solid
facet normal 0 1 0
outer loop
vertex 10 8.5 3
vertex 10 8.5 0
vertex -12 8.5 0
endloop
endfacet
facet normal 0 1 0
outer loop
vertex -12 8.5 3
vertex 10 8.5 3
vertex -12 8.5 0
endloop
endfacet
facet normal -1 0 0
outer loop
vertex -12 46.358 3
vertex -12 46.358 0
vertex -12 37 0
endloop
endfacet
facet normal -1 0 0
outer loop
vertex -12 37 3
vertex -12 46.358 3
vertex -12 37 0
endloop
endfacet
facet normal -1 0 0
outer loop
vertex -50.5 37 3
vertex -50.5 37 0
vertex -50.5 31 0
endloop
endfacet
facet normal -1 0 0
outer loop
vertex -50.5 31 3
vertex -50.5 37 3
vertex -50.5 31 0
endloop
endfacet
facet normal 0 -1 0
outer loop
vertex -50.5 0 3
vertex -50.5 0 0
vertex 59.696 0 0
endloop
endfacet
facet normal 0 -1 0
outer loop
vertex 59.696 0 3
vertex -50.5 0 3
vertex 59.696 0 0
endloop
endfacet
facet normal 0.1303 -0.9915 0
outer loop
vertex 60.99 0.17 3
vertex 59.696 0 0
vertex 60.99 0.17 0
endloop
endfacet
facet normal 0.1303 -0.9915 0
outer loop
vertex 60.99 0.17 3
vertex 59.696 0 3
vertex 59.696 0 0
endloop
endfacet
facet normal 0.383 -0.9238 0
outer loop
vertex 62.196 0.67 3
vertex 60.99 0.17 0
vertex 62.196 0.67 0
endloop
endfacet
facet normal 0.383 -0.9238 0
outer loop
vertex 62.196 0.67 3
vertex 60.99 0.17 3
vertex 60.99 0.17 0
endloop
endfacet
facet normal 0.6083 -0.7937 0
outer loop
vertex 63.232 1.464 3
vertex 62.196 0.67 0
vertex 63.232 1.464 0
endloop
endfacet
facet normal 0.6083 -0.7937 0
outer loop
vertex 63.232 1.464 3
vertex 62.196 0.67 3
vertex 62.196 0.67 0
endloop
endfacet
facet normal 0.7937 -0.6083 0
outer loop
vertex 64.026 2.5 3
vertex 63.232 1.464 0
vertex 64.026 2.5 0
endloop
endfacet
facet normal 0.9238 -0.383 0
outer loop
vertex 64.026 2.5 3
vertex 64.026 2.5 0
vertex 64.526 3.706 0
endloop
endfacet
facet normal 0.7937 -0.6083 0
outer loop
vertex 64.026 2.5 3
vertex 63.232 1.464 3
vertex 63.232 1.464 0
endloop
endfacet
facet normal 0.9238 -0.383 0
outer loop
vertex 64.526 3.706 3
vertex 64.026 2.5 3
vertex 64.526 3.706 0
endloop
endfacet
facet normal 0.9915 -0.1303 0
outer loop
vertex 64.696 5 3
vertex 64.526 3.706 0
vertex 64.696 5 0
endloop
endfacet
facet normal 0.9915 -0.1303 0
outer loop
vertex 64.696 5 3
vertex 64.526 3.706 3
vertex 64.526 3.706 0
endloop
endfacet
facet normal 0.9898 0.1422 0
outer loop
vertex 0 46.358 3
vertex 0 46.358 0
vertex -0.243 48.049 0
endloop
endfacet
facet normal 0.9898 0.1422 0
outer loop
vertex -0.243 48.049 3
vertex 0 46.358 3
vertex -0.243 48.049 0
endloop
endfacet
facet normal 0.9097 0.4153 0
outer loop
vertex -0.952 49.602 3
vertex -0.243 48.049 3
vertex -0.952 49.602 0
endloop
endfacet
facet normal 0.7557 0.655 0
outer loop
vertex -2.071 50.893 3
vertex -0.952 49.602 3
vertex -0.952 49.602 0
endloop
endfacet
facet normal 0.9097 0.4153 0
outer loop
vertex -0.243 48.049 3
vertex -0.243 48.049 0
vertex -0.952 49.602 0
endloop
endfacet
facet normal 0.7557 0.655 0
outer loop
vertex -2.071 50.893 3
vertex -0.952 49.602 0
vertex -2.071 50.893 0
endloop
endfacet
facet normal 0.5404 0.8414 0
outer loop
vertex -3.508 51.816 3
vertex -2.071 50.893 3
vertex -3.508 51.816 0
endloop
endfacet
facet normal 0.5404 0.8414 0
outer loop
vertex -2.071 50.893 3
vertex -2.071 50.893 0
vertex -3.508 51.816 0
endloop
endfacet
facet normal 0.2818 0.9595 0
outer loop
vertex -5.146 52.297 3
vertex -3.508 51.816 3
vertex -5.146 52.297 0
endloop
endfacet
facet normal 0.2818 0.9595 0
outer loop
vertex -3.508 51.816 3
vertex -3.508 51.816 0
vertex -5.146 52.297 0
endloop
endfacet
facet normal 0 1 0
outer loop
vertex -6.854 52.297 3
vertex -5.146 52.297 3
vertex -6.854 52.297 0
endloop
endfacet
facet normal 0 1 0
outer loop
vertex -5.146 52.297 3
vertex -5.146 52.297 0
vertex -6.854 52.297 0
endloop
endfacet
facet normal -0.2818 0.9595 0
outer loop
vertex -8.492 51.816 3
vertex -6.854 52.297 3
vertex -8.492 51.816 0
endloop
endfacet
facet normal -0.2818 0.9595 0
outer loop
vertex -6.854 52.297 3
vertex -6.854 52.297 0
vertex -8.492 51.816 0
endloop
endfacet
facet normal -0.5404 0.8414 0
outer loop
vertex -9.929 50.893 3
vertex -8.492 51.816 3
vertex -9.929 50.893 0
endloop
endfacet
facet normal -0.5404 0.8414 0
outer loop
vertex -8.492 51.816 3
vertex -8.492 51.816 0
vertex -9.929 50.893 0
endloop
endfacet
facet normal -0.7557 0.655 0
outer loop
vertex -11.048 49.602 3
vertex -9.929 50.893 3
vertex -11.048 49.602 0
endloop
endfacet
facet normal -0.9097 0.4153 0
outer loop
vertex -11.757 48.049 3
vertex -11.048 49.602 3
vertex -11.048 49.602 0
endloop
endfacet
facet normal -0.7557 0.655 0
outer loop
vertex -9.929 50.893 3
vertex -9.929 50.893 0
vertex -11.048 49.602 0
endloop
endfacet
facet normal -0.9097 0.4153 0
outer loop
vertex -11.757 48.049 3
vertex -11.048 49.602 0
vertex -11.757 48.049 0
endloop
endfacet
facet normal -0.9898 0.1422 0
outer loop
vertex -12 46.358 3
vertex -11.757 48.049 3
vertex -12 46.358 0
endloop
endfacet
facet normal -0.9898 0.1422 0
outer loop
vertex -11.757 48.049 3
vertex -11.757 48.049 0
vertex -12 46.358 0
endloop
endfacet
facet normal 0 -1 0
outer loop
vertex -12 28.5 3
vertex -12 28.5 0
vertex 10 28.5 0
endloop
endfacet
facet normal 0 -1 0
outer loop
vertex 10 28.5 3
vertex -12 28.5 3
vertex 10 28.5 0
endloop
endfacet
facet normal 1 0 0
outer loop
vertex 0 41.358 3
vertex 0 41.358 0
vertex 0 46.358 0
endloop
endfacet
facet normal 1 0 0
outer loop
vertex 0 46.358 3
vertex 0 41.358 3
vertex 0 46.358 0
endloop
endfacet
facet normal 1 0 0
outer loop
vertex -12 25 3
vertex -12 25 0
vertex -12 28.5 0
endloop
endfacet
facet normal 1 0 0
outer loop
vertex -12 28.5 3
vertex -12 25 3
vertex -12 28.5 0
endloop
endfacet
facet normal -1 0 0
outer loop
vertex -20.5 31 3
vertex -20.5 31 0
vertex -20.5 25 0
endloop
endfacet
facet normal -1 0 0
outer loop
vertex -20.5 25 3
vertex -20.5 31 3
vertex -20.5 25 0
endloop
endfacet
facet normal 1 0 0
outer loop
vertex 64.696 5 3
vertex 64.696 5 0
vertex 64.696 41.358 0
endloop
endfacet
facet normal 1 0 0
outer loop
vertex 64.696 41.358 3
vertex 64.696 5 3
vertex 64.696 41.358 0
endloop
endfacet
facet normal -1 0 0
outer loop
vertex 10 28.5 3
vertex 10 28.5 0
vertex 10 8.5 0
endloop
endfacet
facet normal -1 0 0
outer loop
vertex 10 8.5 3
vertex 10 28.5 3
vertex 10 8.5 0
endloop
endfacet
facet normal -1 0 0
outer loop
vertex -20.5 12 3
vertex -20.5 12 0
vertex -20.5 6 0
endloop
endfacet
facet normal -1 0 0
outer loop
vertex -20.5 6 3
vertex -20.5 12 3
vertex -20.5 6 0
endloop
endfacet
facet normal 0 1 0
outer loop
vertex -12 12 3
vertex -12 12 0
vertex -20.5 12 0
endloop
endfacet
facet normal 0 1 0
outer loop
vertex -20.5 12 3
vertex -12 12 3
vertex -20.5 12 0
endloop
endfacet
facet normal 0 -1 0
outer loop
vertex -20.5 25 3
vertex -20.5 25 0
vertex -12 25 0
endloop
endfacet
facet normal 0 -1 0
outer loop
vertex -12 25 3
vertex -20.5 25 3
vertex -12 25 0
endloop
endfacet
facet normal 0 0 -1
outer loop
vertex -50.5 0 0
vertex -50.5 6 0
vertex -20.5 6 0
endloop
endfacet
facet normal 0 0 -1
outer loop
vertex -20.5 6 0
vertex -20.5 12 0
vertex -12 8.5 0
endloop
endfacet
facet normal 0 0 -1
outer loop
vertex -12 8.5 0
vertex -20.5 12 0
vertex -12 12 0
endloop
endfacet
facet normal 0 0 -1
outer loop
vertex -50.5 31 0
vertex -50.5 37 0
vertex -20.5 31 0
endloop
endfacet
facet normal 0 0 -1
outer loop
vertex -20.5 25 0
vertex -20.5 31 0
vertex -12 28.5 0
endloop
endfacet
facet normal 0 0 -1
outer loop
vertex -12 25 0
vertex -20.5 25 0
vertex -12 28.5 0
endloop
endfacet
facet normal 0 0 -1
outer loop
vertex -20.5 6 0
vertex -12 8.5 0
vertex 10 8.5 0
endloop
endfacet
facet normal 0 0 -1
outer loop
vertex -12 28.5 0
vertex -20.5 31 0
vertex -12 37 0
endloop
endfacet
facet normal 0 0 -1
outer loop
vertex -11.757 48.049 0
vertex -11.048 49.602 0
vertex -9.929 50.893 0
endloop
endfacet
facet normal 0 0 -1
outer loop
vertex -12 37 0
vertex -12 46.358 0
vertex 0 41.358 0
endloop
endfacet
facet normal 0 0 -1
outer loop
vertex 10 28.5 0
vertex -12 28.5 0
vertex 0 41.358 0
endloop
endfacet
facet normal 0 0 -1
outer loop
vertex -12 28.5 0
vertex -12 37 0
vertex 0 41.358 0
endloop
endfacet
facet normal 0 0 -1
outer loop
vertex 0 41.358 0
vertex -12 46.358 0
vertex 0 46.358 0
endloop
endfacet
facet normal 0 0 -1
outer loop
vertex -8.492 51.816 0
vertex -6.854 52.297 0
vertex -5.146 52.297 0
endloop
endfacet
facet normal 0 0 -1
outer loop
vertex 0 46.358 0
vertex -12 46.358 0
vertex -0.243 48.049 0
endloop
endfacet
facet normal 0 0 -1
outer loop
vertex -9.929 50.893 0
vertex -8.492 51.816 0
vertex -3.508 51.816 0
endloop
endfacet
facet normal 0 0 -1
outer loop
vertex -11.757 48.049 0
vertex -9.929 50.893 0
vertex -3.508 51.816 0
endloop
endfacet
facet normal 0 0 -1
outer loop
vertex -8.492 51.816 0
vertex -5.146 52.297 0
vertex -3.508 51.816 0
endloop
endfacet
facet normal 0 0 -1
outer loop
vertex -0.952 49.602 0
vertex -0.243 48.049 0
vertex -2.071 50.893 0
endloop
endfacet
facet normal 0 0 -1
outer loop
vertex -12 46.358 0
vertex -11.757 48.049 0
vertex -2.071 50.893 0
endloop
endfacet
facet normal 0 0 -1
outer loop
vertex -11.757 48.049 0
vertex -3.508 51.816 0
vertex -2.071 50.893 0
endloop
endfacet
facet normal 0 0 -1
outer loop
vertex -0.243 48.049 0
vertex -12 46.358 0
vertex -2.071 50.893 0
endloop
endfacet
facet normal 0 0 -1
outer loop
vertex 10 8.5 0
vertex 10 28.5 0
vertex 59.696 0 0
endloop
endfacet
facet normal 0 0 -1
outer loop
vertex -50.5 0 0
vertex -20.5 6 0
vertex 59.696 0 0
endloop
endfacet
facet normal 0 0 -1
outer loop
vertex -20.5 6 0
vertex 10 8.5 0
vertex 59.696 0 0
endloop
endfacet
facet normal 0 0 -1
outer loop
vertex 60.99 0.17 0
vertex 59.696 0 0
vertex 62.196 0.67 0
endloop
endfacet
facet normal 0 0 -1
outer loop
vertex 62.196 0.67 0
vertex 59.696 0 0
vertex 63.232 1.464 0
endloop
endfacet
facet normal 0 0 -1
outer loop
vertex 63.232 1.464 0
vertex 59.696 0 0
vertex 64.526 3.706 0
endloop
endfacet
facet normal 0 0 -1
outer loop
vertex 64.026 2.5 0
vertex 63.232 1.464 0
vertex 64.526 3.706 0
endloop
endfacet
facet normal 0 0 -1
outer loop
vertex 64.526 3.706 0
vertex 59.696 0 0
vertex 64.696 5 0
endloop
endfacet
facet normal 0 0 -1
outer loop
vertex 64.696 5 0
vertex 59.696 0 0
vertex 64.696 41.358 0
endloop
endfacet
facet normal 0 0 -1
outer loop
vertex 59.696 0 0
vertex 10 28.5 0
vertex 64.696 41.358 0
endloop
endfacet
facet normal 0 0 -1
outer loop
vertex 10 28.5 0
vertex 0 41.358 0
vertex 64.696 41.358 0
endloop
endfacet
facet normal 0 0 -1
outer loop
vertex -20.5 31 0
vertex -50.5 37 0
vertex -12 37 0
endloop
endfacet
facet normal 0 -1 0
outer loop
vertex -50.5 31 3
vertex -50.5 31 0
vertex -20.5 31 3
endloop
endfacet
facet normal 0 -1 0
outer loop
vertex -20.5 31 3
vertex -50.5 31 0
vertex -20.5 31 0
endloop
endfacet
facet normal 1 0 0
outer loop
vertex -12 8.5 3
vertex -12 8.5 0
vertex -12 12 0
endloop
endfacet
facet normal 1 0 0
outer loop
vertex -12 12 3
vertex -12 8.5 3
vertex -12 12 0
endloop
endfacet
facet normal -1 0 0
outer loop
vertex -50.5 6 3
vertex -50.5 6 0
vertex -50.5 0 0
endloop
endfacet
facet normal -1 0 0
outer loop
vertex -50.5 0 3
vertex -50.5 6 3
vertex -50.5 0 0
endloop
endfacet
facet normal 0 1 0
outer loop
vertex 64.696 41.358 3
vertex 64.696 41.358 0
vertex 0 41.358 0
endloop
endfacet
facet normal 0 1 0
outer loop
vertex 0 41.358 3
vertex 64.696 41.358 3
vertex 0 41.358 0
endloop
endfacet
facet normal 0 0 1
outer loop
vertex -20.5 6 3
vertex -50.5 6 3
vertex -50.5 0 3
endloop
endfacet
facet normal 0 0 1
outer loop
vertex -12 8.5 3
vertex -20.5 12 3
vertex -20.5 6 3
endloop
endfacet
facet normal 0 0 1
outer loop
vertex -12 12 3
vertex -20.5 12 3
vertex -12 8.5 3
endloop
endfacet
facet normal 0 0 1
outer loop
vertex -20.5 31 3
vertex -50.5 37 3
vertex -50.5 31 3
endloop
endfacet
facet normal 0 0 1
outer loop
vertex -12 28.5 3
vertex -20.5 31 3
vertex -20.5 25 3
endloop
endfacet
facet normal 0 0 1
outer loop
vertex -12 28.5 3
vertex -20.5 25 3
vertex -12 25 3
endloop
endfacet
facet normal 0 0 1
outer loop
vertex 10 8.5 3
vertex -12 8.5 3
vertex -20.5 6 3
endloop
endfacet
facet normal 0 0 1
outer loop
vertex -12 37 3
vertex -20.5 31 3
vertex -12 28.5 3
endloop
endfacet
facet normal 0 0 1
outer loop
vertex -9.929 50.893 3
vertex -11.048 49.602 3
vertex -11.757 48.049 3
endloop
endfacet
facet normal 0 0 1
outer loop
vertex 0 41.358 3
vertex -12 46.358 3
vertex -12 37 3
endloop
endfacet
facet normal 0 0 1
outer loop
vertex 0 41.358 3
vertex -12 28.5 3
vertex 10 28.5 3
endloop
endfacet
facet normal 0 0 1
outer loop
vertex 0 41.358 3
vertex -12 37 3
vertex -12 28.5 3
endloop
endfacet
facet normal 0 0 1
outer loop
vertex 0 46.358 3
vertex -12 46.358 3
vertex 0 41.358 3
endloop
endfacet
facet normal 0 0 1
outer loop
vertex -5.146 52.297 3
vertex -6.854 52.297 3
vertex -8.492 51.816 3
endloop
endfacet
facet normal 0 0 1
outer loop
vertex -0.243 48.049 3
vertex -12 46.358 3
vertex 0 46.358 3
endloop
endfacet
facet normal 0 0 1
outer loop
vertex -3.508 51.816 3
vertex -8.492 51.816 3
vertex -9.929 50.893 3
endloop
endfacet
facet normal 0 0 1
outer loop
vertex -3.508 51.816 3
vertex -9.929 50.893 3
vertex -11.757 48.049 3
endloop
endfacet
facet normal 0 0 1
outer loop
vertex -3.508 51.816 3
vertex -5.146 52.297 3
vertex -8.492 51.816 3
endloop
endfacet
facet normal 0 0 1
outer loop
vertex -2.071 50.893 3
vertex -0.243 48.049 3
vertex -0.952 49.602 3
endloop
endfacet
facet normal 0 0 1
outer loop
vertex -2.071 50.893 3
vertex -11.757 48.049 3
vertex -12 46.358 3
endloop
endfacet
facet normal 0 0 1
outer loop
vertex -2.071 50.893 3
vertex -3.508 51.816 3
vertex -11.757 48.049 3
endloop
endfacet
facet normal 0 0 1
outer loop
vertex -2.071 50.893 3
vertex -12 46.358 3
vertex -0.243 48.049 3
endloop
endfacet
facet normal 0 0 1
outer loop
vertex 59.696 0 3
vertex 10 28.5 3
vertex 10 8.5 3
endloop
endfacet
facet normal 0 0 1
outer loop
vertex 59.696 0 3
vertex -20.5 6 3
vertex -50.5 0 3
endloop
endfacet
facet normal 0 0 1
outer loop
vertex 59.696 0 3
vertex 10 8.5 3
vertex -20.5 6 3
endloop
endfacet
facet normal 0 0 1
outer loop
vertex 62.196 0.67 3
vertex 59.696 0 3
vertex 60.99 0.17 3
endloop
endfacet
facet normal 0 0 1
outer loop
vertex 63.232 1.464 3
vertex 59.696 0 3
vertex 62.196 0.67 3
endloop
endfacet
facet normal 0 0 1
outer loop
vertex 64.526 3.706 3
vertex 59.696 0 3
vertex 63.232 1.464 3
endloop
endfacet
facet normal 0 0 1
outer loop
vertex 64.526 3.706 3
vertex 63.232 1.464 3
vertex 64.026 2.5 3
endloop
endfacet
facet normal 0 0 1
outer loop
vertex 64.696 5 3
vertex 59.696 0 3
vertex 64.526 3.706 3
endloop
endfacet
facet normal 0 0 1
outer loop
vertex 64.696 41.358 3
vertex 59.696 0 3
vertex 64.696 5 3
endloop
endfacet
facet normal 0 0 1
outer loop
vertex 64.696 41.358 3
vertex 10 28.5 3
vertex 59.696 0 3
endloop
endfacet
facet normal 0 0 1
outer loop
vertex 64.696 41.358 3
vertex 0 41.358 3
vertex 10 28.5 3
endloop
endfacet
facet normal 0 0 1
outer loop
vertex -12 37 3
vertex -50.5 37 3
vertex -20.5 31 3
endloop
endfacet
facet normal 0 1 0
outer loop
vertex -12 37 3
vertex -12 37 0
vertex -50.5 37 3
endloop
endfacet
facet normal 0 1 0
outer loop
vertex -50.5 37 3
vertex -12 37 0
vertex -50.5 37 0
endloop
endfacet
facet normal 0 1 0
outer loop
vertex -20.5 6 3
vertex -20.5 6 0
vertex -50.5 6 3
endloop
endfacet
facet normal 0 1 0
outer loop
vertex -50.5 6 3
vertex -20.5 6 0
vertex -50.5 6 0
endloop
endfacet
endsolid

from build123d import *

# Parameters (mm, degrees)
F1_DEPTH = 3
F2_R     = 5


with BuildPart() as f1:
    # F0 (on Top) → F1 (new body)
    with BuildSketch(Plane.XY):
        with BuildLine():
            Line((-50.5, 0), (64.696152, 0))
            Line((64.696152, 0), (64.696152, 41.358293))
            Line((64.696152, 41.358293), (0, 41.358293))
            Line((0, 41.358293), (0, 46.358293))
            ThreePointArc((0, 46.358293), (-6, 52.358293), (-12, 46.358293))
            Line((-12, 46.358293), (-12, 37))
            Line((-12, 37), (-50.5, 37))
            Line((-50.5, 37), (-50.5, 31))
            Line((-50.5, 31), (-20.5, 31))
            Line((-20.5, 31), (-20.5, 25))
            Line((-20.5, 25), (-12, 25))
            Line((-12, 25), (-12, 28.5))
            Line((-12, 28.5), (0, 28.5))
            Line((0, 28.5), (10, 28.5))
            Line((10, 28.5), (10, 8.5))
            Line((10, 8.5), (0, 8.5))
            Line((0, 8.5), (-12, 8.5))
            Line((-12, 8.5), (-12, 12))
            Line((-12, 12), (-20.5, 12))
            Line((-20.5, 12), (-20.5, 6))
            Line((-20.5, 6), (-50.5, 6))
            Line((-50.5, 6), (-50.5, 0))
        make_face()
    extrude(amount=F1_DEPTH)

    # F2
    f2_edges = [f1.edges().sort_by_distance(p)[0] for p in [
        (64.696152, 0, 1.5),
    ]]
    fillet(f2_edges, radius=F2_R)


solid = f1.part
